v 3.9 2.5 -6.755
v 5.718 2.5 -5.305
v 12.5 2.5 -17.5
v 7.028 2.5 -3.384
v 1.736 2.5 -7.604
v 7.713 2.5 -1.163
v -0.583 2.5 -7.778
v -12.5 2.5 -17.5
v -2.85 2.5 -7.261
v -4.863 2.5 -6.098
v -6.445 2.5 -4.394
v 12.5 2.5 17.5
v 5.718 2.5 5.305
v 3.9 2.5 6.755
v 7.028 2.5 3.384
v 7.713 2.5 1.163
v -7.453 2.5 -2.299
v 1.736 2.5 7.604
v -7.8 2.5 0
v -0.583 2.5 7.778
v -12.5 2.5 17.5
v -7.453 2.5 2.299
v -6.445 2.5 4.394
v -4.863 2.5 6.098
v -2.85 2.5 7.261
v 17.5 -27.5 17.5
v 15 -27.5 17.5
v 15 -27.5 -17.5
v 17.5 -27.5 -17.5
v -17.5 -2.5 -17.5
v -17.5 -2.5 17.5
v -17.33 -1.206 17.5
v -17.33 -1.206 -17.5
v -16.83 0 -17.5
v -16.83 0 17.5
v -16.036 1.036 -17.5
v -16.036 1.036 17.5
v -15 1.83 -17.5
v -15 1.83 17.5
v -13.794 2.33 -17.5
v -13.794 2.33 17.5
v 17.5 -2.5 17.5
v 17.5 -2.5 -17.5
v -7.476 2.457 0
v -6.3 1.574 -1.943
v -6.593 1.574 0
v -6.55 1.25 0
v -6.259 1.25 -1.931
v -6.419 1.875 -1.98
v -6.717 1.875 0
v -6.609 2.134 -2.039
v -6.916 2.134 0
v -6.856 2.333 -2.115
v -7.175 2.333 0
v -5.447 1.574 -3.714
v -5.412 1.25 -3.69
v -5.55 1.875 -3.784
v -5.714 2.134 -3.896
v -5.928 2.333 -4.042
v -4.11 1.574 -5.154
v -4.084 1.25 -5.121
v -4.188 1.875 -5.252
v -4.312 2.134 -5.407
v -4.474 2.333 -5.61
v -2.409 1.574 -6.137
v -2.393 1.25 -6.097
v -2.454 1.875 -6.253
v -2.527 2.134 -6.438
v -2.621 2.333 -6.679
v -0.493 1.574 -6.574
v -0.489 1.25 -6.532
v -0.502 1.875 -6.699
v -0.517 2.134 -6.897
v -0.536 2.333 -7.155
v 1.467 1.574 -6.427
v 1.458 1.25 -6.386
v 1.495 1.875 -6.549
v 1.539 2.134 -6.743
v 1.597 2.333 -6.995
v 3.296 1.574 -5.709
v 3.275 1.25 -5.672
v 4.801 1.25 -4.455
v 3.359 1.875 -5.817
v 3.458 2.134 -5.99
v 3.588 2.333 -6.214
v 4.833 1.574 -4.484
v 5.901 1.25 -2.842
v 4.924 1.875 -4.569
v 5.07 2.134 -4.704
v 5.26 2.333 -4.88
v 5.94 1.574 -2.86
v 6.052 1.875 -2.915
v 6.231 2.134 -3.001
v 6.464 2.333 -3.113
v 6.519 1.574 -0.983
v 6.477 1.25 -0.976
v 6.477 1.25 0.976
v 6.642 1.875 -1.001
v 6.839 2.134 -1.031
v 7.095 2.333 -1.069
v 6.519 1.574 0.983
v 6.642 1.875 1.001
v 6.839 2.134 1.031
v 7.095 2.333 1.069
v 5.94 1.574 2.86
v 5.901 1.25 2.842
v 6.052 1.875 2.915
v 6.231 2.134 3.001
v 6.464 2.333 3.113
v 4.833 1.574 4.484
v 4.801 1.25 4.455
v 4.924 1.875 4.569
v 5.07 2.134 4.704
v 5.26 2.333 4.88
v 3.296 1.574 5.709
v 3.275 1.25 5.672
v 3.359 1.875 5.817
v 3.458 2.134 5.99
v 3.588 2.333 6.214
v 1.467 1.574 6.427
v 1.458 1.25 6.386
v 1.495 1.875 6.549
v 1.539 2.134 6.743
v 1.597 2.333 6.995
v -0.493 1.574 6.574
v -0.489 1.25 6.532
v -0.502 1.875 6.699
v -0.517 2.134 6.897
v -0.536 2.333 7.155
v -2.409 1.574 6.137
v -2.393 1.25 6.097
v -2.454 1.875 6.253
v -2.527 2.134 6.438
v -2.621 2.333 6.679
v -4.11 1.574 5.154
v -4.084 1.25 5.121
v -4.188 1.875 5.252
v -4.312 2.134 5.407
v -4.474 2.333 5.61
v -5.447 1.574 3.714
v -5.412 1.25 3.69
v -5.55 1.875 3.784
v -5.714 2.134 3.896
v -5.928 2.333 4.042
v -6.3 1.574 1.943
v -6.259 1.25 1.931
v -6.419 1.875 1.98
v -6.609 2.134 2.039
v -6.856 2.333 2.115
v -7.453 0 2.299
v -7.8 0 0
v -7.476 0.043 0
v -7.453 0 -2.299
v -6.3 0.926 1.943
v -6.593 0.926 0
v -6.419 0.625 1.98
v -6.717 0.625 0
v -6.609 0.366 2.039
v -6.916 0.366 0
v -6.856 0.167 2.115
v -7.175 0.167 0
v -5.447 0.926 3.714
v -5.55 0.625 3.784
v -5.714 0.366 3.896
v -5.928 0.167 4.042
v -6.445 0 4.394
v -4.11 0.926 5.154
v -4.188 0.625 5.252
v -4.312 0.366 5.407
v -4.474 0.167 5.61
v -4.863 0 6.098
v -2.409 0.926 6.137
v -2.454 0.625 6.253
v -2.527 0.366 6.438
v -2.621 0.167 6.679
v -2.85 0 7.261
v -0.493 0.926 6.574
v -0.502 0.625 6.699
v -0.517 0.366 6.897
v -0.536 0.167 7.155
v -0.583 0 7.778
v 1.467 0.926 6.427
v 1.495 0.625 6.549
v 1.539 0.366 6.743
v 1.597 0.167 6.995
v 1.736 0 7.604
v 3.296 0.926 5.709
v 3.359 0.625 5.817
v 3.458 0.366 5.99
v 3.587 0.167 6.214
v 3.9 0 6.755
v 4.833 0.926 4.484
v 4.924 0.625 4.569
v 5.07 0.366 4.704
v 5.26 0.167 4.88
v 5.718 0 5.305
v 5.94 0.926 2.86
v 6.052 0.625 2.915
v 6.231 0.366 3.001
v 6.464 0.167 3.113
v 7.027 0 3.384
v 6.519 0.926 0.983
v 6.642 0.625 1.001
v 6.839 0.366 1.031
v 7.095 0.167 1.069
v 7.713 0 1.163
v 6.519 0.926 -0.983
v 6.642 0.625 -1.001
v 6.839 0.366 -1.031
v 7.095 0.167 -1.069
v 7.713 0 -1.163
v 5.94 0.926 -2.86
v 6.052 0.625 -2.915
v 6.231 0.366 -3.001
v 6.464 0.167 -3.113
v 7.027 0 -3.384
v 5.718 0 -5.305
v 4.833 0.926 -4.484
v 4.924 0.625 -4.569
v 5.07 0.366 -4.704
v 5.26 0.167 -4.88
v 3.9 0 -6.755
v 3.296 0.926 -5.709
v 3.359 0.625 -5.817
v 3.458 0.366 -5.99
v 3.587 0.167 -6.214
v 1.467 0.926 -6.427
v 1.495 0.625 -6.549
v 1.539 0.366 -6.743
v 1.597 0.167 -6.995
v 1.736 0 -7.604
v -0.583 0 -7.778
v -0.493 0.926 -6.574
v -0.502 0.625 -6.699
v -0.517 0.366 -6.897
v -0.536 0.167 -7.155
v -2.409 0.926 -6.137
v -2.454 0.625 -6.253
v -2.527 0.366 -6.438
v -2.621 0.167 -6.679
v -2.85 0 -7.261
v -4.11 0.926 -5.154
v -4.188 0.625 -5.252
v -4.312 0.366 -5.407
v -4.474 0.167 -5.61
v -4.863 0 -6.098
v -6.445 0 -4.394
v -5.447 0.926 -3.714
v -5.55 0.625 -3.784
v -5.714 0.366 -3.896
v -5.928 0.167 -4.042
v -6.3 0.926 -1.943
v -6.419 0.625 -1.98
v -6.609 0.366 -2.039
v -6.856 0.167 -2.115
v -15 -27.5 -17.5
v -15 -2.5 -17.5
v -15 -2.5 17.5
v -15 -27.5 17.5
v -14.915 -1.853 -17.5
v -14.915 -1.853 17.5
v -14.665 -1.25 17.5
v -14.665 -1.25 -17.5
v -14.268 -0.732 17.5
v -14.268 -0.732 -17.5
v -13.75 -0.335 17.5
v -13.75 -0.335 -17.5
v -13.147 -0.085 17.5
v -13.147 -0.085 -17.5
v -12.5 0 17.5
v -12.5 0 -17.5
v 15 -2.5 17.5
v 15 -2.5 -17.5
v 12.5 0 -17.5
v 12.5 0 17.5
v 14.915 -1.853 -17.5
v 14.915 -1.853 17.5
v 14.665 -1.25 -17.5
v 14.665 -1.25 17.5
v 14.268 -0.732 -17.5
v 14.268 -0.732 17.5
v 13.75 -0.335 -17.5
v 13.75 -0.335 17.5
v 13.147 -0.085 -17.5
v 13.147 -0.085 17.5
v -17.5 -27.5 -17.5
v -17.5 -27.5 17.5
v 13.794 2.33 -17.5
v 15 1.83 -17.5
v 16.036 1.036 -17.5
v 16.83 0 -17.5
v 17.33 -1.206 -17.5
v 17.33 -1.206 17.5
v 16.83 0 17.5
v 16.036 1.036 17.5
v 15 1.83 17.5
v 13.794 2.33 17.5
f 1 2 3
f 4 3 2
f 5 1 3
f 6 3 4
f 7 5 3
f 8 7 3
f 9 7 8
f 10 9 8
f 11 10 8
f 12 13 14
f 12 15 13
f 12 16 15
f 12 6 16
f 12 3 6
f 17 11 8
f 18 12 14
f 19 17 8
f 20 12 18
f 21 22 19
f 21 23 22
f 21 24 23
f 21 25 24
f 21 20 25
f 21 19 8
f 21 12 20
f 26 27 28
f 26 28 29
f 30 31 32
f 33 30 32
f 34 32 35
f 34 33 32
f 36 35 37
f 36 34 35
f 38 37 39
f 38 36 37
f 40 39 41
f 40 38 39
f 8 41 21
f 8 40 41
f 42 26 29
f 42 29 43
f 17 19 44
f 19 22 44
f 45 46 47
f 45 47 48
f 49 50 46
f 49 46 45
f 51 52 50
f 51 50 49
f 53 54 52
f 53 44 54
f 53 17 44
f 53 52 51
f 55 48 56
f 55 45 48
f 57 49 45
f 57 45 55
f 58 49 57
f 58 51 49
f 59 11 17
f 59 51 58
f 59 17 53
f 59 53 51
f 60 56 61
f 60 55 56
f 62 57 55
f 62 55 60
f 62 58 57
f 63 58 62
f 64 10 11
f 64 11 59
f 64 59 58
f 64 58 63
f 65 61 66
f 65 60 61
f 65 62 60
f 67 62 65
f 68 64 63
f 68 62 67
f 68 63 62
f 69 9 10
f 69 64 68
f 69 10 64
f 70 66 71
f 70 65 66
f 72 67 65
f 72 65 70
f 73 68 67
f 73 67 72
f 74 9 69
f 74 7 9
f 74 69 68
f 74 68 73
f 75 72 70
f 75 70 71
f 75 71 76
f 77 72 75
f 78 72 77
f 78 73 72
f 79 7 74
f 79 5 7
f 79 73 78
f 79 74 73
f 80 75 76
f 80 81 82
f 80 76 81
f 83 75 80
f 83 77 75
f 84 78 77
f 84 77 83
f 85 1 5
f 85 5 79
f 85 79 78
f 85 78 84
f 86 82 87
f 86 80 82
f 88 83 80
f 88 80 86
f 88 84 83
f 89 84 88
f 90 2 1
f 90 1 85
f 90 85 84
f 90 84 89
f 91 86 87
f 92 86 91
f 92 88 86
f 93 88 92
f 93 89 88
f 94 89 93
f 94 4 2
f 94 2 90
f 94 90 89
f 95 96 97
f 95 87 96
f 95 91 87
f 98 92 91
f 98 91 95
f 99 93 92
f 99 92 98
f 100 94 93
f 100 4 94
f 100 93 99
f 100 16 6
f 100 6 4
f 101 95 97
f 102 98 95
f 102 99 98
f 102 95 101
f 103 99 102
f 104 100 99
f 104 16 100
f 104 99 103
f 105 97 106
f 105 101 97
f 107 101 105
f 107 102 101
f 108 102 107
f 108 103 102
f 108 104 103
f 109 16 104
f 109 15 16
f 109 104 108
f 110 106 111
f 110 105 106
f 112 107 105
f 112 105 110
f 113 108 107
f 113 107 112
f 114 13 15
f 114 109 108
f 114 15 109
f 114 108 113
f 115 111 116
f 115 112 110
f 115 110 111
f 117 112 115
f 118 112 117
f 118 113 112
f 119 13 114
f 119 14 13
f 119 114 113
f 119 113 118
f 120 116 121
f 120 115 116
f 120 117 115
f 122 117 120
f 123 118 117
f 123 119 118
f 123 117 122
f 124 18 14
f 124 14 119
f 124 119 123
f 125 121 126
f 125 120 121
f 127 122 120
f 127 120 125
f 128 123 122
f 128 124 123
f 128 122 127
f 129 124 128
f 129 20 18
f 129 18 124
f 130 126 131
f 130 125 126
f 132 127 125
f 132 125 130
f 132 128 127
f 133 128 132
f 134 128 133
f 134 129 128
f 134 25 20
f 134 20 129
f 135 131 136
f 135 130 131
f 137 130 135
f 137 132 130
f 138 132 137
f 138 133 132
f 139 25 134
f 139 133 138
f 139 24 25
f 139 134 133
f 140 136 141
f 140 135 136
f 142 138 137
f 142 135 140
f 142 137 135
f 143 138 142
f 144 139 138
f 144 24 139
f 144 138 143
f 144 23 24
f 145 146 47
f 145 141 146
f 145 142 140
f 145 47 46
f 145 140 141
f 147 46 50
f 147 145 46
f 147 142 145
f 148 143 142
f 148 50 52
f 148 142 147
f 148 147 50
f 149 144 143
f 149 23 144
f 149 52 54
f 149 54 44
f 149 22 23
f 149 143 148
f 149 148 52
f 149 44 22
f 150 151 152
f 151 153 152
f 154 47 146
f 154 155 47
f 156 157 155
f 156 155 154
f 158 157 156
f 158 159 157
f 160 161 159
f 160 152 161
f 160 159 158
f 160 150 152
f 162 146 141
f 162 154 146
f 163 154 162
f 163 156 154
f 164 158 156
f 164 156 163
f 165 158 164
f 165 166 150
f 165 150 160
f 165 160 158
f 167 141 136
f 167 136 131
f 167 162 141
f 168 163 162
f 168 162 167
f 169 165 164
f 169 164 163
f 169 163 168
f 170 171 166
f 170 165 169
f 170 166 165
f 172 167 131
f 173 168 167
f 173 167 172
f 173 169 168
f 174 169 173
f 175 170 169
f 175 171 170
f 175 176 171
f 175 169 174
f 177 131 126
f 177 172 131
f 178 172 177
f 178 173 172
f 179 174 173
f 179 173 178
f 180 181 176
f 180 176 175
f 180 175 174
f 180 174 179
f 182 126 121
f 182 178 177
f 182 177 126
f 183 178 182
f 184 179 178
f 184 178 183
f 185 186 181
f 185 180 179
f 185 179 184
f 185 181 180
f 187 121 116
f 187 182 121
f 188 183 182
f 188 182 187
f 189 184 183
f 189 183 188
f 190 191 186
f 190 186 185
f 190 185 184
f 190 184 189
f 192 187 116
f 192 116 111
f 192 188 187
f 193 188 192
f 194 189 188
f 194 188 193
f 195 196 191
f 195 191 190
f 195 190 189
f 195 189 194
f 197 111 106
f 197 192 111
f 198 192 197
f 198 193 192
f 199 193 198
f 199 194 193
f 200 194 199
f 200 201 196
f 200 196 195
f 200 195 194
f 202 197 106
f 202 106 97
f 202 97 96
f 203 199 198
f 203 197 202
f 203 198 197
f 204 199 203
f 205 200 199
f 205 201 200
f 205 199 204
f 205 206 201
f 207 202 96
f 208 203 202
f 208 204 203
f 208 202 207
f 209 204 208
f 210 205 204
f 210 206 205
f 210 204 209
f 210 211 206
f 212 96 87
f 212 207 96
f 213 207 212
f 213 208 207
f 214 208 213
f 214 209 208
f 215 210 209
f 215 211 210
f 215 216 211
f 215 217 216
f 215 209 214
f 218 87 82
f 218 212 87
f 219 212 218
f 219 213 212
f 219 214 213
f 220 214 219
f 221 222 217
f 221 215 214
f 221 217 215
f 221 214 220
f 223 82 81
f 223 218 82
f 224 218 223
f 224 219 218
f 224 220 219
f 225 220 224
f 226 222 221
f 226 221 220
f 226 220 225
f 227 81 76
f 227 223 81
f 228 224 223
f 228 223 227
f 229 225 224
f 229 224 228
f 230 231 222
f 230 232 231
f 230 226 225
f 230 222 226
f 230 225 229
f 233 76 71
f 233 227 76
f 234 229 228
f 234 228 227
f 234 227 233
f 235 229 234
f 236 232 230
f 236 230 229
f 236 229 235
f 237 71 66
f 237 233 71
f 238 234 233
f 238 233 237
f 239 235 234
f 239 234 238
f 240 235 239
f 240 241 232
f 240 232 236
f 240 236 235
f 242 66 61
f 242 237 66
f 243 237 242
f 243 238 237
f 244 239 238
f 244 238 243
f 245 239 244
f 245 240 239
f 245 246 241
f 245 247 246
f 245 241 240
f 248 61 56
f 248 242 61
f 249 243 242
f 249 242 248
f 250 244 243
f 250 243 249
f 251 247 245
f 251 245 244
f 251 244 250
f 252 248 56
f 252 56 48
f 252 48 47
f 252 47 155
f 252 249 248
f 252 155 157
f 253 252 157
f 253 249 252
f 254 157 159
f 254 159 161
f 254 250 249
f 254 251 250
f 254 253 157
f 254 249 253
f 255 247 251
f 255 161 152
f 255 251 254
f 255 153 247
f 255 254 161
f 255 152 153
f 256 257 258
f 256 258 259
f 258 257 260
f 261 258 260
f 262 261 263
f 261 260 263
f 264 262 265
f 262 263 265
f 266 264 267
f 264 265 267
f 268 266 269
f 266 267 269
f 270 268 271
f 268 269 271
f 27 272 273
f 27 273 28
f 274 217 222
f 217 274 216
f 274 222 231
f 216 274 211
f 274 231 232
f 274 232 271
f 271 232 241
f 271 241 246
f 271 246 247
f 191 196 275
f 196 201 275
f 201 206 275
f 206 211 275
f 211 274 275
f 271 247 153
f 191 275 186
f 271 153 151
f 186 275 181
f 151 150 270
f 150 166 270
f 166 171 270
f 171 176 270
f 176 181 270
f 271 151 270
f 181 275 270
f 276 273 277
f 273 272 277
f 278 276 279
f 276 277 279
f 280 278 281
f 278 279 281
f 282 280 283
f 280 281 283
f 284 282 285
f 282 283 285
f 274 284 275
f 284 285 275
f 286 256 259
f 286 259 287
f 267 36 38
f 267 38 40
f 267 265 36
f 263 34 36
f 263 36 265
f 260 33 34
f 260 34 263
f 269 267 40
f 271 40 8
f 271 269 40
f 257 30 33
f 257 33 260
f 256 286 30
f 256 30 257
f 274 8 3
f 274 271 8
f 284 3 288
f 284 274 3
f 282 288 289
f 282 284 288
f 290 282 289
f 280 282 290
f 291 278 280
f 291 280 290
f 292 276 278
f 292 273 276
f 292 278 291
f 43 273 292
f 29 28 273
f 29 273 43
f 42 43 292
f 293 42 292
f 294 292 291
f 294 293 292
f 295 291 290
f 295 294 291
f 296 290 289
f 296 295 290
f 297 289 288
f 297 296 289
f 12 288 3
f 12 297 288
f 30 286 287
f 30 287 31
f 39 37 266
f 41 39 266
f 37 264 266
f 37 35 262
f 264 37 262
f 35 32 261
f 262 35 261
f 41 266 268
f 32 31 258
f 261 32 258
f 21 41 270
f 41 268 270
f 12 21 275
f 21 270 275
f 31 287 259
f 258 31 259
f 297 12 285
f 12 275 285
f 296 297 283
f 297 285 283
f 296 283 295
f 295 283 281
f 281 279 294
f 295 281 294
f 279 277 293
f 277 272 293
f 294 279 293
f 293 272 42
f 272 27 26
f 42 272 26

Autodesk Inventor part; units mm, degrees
ref_plane "YZ Plane" through (0, 0, 0) normal (1, 0, 0) x (0, 1, 0)
ref_plane "XZ Plane" through (0, 0, 0) normal (0, 1, 0) x (-1, 0, 0)
ref_plane "XY Plane" through (0, 0, 0) normal (0, 0, 1) x (1, 0, 0)
sketch "Náčrt2" plane through (0, 0, 0) normal (0, 1, 0) x (-1, 0, 0)
  line L0 (17.5, 17.5) -> (-17.5, 17.5)
  line L1 (-17.5, 17.5) -> (-17.5, -17.5)
  line L2 (-17.5, -17.5) -> (17.5, -17.5)
  line L3 (17.5, -17.5) -> (17.5, 17.5)
  circle A0 centre (0, 0) radius 6.55
  point P0 (17.5, 0)
  point P1 (0, 17.5)
  dimension "d0" = 35
  dimension "d1" = 35
  dimension "d22" = 13.1
extrude "Vysunutí1" add sketch "Náčrt2" along normal blind 2.5
sketch "Náčrt5" plane through (-15, 2.5, -17.5) normal (-1, 0, 0) x (0, -1, 0)
  line L0 (0, 35) -> (0, 0)
  line L1 (0, 0) -> (30, 0)
  line L2 (30, 0) -> (30, 35)
  line L3 (30, 35) -> (0, 35)
edge flange "Obruba2" height 30 angle 90 thickness 2.5 bend radius 2.5 thickness toward (-1, 0, 0) relief tear relief width 2.5 relief depth 1.25 corner gap 2.5 corner form 0 edges at (-17.5, 0, 0) (17.5, 0, 0) wall of the first edge with corners at (-15, 2.5, 17.5) (-15, 2.5, -17.5) (-15, -27.5, -17.5) (-15, -27.5, 17.5)
bend "Ohyb2"
corner "Roh2"
fillet "Zaoblení6" radius 1.25 1 edges at (6.55, 2.5, 0)
fillet "Zaoblení7" radius 1.25 1 edges at (6.55, 0, 0)
equation "\"d29\" = ŠířkaVýštipu"
equation "\"d30\" = HloubkaVýštipu"
equation "\"d31\" = MinimálníZbytek"
equation "\"d32\" = PoloměrOhybu"
equation "\"d35\" = PoloměrOhybu"
equation "\"d36\" = VelikostRohovéhoVýštipu"
equation "\"d37\" = VelikostMezery"
equation "\"d38\" = VelikostJacobihoPoloměru"
equation "\"PoloměrOhybu\" = Tloušťka"
equation "\"ŠířkaVýštipu\" = Tloušťka"
equation "\"HloubkaVýštipu\" = 0.5 * Tloušťka"
equation "\"MinimálníZbytek\" = 2 * Tloušťka"
equation "\"PřechodovýPoloměr\" = PoloměrOhybu"
equation "\"VelikostJacobihoPoloměru\" = PoloměrOhybu"
equation "\"VelikostMezery\" = Tloušťka"
equation "\"VelikostRohovéhoVýštipu\" = 10"
equation "\"Tloušťka\" = 2.5"
properties part number "DD_KVD_002_11" material "Nerezová ocel"
